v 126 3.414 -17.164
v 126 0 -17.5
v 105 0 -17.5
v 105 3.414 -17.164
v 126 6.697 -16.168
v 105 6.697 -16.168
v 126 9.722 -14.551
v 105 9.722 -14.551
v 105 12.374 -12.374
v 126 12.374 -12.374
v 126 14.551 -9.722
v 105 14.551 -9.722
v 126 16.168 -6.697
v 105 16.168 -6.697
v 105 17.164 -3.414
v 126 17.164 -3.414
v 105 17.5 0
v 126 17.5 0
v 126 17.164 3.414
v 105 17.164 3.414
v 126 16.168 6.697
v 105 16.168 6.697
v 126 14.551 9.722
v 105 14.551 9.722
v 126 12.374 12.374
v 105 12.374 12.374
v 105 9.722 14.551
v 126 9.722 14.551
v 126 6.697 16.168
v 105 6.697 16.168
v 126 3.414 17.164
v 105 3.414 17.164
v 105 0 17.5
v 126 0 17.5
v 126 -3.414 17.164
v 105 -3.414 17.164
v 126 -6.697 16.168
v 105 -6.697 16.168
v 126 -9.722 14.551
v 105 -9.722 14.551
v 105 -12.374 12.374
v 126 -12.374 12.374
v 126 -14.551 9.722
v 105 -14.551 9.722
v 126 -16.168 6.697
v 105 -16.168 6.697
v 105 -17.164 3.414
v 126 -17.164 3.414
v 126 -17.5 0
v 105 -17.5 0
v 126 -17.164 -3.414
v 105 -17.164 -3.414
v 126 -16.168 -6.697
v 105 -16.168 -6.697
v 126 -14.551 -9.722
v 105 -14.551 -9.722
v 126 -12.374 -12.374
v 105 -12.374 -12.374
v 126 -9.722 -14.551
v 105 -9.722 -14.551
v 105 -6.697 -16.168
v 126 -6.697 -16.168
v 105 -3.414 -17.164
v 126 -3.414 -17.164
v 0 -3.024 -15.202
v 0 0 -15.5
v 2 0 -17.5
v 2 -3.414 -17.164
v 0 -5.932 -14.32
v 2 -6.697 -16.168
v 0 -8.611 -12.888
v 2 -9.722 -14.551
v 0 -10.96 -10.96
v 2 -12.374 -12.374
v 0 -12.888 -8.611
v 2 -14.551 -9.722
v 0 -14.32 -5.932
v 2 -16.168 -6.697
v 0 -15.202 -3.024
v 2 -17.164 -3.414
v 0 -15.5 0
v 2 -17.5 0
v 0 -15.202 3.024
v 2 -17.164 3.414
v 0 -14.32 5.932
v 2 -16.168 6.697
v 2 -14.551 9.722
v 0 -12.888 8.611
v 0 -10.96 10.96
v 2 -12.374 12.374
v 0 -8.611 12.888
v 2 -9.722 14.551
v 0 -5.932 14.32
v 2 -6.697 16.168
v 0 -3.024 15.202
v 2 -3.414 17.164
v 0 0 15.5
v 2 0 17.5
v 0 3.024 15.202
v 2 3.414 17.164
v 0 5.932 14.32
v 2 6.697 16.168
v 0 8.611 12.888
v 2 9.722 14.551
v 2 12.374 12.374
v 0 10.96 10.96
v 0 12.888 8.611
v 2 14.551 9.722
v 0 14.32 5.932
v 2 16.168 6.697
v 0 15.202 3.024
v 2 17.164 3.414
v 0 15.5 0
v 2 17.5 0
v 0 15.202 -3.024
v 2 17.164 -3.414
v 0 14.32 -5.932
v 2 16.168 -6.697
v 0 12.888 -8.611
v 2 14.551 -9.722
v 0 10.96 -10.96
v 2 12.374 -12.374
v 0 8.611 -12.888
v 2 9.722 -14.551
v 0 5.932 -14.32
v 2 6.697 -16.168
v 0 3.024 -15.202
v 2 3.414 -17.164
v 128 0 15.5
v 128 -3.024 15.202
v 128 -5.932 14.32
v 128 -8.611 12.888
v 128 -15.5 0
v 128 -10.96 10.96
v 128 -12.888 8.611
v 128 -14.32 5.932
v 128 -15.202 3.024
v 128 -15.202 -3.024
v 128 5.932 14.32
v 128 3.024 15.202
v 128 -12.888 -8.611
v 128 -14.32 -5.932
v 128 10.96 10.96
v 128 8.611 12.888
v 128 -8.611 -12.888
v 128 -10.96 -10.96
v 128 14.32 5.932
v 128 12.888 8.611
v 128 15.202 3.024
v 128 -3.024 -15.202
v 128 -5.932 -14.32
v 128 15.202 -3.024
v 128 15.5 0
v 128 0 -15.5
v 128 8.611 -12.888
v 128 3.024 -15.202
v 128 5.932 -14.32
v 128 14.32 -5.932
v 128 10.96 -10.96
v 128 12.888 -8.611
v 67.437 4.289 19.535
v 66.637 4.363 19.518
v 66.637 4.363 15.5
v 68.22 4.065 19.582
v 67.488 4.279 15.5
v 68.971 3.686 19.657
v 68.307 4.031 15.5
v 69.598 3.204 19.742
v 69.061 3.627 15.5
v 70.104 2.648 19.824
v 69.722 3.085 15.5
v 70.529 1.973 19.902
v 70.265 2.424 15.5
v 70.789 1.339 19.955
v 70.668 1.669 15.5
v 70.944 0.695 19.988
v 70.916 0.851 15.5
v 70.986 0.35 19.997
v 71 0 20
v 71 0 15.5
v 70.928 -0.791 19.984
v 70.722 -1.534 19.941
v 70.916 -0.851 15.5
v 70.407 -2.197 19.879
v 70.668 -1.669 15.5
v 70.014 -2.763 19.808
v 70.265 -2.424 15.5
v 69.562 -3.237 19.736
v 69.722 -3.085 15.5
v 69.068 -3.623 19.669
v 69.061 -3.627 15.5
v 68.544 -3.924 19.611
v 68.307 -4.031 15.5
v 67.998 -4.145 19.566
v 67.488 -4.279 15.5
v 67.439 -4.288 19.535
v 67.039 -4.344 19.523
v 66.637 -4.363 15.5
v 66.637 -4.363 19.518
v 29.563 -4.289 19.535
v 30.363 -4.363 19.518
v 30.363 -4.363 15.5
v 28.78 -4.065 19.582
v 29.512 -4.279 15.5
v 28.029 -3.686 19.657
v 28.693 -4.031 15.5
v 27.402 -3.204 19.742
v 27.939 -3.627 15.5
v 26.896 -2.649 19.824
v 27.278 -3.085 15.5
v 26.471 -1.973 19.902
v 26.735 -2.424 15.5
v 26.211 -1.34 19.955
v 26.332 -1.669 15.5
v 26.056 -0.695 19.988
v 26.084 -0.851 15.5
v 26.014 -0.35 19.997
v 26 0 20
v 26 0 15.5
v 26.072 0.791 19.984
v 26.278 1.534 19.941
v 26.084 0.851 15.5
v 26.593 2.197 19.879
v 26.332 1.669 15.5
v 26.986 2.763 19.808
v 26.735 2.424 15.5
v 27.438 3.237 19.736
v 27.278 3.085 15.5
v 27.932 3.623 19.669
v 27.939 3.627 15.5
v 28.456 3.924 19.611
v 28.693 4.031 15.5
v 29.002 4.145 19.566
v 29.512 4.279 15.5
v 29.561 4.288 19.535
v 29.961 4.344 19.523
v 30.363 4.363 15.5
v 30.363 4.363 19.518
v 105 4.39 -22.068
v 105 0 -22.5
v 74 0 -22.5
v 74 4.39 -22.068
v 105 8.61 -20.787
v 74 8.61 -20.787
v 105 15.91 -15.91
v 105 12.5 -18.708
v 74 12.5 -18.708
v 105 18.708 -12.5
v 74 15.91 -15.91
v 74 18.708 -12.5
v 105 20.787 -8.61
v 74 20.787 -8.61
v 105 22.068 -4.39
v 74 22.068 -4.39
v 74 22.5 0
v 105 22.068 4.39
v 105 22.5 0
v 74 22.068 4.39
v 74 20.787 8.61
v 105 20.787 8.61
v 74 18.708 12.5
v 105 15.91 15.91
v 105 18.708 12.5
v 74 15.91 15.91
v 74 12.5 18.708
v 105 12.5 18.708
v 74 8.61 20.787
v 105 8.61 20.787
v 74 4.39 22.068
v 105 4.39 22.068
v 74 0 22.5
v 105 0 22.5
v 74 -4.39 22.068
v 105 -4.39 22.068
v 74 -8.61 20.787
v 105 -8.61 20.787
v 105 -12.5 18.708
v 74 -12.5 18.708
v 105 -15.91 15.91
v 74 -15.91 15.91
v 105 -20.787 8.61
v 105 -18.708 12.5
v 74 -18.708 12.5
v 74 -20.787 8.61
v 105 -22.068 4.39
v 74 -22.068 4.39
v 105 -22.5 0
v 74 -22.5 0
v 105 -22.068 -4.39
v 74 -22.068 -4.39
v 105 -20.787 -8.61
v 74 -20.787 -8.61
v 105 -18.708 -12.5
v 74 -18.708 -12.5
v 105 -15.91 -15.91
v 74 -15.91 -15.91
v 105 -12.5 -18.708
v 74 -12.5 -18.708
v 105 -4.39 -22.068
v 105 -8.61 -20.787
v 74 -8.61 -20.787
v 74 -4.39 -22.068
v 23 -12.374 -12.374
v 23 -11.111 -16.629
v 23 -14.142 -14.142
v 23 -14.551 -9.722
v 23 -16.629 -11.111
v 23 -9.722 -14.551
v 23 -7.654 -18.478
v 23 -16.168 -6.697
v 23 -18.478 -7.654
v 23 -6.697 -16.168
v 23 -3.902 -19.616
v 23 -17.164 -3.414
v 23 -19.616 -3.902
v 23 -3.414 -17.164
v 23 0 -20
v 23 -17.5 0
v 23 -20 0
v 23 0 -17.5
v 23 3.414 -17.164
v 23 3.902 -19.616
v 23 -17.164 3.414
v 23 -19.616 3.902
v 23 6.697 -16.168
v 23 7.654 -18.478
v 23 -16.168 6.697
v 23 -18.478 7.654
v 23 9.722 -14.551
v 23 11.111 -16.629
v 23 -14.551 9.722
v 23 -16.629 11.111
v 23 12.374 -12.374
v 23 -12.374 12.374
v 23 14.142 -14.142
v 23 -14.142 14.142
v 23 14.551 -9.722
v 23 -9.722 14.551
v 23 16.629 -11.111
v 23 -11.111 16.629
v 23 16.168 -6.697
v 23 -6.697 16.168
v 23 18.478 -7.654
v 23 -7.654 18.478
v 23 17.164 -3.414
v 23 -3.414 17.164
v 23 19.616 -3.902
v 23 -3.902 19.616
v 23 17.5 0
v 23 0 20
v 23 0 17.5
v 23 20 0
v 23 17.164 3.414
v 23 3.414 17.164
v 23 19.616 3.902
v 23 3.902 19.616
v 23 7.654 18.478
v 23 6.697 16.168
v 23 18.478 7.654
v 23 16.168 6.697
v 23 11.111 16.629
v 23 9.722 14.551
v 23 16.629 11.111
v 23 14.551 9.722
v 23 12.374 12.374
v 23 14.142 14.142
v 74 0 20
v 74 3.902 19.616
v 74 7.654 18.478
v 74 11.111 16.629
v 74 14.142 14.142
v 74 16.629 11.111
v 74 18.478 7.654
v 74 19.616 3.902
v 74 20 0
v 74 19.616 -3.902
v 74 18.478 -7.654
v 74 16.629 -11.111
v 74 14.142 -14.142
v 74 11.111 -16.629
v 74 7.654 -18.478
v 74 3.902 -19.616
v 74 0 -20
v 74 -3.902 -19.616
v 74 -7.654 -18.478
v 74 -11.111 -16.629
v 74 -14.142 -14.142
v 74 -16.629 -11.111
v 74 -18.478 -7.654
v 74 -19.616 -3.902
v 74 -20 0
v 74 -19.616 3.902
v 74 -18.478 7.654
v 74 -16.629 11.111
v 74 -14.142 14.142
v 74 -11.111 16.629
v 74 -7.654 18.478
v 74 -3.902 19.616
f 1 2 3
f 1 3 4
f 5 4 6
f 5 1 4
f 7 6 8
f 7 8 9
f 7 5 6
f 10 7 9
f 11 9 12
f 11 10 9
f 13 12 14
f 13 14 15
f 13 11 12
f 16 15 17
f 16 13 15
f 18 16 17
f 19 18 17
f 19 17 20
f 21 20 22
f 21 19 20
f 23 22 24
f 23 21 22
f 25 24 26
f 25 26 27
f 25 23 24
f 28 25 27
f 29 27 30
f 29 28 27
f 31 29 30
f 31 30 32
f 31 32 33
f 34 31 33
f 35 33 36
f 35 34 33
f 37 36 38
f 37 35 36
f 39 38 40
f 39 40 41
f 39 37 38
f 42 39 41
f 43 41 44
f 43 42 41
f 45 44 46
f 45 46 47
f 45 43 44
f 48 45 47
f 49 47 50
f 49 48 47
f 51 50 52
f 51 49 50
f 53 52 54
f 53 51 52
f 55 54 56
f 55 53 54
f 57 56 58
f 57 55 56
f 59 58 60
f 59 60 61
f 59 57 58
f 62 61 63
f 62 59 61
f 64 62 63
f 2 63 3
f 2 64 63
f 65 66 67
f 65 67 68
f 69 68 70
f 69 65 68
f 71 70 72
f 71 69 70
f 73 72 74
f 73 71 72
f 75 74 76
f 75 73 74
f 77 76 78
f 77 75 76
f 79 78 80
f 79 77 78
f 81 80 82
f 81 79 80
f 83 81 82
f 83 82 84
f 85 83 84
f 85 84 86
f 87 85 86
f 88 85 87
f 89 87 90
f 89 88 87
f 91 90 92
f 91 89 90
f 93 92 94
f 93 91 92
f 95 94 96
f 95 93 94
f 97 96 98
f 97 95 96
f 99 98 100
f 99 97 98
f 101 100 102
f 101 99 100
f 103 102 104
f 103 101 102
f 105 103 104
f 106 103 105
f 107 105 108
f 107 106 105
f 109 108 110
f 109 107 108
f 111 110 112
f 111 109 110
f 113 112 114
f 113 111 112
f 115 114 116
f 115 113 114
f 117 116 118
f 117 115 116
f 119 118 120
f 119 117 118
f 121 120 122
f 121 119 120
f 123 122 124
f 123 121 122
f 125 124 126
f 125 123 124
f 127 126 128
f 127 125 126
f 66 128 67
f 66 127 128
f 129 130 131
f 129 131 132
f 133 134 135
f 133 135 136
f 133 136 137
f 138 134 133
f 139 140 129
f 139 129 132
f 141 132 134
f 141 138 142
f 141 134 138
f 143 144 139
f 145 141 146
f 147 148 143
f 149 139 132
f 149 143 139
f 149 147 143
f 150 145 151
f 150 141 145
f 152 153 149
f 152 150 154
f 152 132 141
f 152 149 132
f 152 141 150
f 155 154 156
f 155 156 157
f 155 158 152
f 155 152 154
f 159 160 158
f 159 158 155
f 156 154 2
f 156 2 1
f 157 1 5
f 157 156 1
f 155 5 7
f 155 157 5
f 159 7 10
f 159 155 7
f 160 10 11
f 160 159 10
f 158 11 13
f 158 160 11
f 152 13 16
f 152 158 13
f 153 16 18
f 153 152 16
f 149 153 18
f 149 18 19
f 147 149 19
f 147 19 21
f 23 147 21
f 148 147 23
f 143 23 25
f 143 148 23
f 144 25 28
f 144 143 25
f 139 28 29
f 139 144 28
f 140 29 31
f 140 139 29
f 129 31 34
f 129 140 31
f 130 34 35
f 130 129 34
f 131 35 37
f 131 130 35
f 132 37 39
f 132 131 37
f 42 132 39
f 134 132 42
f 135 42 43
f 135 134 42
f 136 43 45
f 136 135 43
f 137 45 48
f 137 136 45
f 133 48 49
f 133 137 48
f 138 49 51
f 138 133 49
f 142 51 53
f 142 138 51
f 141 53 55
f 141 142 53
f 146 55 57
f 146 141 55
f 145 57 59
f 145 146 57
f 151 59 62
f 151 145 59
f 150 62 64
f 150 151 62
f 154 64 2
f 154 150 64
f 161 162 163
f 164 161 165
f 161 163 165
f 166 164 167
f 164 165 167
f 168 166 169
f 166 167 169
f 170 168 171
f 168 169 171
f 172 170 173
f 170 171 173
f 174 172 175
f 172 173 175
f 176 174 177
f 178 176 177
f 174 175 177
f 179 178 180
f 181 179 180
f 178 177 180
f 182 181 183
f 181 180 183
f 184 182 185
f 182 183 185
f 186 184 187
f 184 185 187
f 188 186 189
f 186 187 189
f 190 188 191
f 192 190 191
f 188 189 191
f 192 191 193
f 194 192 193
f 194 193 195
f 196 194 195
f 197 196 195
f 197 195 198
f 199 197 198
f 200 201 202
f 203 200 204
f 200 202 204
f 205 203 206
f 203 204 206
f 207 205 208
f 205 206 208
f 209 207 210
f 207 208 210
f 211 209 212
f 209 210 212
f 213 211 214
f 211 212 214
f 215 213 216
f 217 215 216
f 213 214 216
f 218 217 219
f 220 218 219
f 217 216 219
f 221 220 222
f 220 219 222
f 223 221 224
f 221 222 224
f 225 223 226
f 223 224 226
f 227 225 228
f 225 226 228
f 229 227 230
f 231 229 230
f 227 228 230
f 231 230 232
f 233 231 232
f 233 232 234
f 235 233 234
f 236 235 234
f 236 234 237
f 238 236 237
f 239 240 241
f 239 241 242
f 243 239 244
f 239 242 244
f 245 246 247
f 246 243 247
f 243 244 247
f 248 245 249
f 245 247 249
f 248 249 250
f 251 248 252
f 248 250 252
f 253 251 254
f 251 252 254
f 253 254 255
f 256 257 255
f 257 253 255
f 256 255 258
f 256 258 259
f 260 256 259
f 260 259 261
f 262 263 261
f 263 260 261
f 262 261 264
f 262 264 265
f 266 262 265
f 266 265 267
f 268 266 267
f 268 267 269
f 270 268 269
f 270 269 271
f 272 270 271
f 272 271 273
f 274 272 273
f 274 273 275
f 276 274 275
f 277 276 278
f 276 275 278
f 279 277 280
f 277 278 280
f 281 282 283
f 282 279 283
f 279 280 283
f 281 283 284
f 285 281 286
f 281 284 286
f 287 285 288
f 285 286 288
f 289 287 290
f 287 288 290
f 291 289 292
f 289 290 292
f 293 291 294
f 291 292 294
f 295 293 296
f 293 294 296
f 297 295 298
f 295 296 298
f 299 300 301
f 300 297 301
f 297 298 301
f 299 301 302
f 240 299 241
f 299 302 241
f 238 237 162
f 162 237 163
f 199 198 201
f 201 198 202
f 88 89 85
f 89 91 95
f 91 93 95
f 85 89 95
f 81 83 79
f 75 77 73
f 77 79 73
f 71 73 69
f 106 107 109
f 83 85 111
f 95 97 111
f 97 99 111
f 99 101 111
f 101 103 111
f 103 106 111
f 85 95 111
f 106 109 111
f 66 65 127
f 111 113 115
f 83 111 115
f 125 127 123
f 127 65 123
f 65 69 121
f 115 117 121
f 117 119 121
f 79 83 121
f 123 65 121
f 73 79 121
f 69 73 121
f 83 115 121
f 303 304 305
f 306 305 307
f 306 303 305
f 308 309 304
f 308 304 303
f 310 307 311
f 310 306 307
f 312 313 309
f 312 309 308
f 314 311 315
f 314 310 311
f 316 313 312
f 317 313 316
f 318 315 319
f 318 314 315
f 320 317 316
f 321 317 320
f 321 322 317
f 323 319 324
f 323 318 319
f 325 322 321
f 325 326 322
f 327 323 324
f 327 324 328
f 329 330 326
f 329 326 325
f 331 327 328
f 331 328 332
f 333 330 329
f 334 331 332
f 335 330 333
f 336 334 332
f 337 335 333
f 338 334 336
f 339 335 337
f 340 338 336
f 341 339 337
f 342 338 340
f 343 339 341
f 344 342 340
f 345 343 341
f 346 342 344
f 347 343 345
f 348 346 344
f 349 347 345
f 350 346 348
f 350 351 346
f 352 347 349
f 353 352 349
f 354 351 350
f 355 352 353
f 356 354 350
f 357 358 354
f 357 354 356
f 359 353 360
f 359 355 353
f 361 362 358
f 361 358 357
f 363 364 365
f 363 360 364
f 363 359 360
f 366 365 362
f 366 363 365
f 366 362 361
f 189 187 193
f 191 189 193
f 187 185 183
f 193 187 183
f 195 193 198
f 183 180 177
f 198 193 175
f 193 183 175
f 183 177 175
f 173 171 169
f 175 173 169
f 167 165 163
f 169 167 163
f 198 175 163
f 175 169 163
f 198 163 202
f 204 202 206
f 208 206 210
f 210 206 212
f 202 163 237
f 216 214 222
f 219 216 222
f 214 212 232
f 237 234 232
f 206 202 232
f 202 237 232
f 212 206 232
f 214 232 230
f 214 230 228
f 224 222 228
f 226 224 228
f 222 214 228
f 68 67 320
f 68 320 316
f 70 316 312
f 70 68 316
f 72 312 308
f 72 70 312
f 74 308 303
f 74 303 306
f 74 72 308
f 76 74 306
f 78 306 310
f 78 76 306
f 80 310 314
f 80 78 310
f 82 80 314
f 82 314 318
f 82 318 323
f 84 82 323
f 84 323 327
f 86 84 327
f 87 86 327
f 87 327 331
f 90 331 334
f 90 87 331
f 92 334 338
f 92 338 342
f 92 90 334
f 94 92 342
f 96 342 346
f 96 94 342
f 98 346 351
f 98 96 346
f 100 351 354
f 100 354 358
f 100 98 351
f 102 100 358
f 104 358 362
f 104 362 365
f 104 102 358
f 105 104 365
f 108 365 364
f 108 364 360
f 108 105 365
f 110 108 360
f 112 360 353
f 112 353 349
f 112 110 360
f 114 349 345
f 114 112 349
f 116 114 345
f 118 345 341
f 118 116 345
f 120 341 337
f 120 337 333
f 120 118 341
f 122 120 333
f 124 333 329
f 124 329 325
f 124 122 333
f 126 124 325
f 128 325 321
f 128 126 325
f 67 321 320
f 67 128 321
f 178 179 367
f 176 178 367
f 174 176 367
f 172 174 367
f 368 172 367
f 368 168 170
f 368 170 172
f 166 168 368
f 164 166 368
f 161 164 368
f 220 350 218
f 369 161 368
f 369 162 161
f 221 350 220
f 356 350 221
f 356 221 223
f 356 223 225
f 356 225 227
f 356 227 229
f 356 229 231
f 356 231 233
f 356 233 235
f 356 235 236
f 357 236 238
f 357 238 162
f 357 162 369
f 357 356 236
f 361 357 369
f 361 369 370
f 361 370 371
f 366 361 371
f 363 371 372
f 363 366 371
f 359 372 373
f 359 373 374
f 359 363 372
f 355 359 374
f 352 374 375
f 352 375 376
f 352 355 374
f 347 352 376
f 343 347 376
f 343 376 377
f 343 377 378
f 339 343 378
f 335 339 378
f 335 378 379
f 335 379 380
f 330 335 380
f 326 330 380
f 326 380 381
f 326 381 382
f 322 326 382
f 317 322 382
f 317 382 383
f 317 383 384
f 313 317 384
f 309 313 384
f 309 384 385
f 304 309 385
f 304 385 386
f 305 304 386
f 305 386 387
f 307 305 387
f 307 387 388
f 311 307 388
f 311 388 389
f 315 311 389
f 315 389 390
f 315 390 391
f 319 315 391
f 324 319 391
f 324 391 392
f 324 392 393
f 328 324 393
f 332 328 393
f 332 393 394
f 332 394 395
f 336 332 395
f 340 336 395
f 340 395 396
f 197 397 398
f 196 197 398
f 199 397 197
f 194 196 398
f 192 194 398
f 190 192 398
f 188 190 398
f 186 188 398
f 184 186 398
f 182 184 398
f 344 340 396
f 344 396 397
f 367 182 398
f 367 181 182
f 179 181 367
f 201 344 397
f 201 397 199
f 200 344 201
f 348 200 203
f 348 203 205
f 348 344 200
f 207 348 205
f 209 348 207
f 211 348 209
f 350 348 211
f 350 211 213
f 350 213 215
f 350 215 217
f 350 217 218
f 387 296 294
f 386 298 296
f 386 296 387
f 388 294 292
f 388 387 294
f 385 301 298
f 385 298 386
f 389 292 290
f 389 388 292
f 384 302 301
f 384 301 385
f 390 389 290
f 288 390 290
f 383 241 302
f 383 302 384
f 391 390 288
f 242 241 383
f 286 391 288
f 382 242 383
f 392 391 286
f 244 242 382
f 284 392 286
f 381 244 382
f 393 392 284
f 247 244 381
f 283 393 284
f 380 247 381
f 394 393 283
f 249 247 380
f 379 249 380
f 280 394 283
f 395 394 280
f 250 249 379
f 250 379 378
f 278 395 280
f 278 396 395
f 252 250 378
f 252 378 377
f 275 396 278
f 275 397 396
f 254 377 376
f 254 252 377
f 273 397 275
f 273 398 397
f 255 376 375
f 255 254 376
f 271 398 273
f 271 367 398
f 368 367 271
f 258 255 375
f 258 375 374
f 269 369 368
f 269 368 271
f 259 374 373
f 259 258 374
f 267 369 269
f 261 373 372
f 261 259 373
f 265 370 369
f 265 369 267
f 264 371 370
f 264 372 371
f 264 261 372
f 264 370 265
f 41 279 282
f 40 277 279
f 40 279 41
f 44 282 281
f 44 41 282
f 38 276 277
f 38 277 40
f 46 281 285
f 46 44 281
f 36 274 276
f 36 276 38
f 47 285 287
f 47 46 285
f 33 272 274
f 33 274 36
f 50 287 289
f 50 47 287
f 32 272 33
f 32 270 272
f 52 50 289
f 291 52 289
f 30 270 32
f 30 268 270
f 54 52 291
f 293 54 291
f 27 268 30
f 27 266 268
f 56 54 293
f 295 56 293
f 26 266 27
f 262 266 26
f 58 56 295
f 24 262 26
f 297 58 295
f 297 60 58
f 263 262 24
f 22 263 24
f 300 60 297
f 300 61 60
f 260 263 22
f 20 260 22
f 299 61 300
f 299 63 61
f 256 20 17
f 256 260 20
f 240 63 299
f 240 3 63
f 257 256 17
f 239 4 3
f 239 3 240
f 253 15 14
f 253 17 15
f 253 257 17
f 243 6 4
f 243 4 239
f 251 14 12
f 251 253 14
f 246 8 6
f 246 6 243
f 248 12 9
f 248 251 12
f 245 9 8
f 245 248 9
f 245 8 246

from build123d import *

# Parameters (mm, degrees)
SKETCH_1_R          = 22.5
EXTRUDE_1_DEPTH     = 128
SKETCH_2_OUTSIDE_W  = 75.59
SKETCH_2_OUTSIDE_H  = 75.59
SKETCH_2_OUTSIDE_R  = 17.5
CUT_EXTRUDE_1_DEPTH = 23
SKETCH_3_OUTSIDE_W  = 75.59
SKETCH_3_OUTSIDE_H  = 75.59
SKETCH_3_OUTSIDE_R  = 20
CUT_EXTRUDE_2_DEPTH = 74
SKETCH_4_OUTSIDE_W  = 75.59
SKETCH_4_OUTSIDE_H  = 75.59
SKETCH_4_OUTSIDE_R  = 17.5
CUT_EXTRUDE_3_DEPTH = 23
CUT_EXTRUDE_START   = 15.5
CUT_EXTRUDE_4_DEPTH = 117.3957922
CHAMFER_1_SIZE      = 2


with BuildPart() as part:
    # 草图1 → 凸台-拉伸1 (new body)
    with BuildSketch(Plane(origin=(0, 0, 0), x_dir=(0, 0, -1), z_dir=(1, 0, 0))):
        Circle(SKETCH_1_R)
    extrude(amount=EXTRUDE_1_DEPTH)

    # 草图2 outside → 切除-拉伸1 (cut)
    with BuildSketch(Plane(origin=(128, 0, 0), x_dir=(0, 0, -1), z_dir=(1, 0, 0))):
        Rectangle(SKETCH_2_OUTSIDE_W, SKETCH_2_OUTSIDE_H)
        Circle(SKETCH_2_OUTSIDE_R, mode=Mode.SUBTRACT)
    extrude(amount=-CUT_EXTRUDE_1_DEPTH, mode=Mode.SUBTRACT)

    # 草图3 outside → 切除-拉伸2 (cut)
    with BuildSketch(Plane.ZY):
        Rectangle(SKETCH_3_OUTSIDE_W, SKETCH_3_OUTSIDE_H)
        Circle(SKETCH_3_OUTSIDE_R, mode=Mode.SUBTRACT)
    extrude(amount=-CUT_EXTRUDE_2_DEPTH, mode=Mode.SUBTRACT)

    # 草图4 outside → 切除-拉伸3 (cut)
    with BuildSketch(Plane.ZY):
        Rectangle(SKETCH_4_OUTSIDE_W, SKETCH_4_OUTSIDE_H)
        with Locations(Location((0, 0, 0), (0, 0, 180))):
            Circle(SKETCH_4_OUTSIDE_R, mode=Mode.SUBTRACT)
    extrude(amount=-CUT_EXTRUDE_3_DEPTH, mode=Mode.SUBTRACT)

    # 草图5 → 切除-拉伸4 (cut, through all)
    with BuildSketch(Plane.XY.offset(CUT_EXTRUDE_START)):
        with BuildLine():
            Line((30.362609491, 4.362609491), (66.637390509, 4.362609491))
            ThreePointArc((66.637390509, 4.362609491), (71, 0), (66.637390509, -4.362609491))
            Line((66.637390509, -4.362609491), (30.362609491, -4.362609491))
            ThreePointArc((30.362609491, -4.362609491), (26, 0), (30.362609491, 4.362609491))
        make_face()
    extrude(amount=CUT_EXTRUDE_4_DEPTH, mode=Mode.SUBTRACT)

    # 倒角1
    chamfer_1_edges = [part.edges().sort_by_distance(p)[0] for p in [
        (128, 0, 17.5),
        (0, 0, 17.5),
    ]]
    chamfer(chamfer_1_edges, length=CHAMFER_1_SIZE)


solid = part.part
